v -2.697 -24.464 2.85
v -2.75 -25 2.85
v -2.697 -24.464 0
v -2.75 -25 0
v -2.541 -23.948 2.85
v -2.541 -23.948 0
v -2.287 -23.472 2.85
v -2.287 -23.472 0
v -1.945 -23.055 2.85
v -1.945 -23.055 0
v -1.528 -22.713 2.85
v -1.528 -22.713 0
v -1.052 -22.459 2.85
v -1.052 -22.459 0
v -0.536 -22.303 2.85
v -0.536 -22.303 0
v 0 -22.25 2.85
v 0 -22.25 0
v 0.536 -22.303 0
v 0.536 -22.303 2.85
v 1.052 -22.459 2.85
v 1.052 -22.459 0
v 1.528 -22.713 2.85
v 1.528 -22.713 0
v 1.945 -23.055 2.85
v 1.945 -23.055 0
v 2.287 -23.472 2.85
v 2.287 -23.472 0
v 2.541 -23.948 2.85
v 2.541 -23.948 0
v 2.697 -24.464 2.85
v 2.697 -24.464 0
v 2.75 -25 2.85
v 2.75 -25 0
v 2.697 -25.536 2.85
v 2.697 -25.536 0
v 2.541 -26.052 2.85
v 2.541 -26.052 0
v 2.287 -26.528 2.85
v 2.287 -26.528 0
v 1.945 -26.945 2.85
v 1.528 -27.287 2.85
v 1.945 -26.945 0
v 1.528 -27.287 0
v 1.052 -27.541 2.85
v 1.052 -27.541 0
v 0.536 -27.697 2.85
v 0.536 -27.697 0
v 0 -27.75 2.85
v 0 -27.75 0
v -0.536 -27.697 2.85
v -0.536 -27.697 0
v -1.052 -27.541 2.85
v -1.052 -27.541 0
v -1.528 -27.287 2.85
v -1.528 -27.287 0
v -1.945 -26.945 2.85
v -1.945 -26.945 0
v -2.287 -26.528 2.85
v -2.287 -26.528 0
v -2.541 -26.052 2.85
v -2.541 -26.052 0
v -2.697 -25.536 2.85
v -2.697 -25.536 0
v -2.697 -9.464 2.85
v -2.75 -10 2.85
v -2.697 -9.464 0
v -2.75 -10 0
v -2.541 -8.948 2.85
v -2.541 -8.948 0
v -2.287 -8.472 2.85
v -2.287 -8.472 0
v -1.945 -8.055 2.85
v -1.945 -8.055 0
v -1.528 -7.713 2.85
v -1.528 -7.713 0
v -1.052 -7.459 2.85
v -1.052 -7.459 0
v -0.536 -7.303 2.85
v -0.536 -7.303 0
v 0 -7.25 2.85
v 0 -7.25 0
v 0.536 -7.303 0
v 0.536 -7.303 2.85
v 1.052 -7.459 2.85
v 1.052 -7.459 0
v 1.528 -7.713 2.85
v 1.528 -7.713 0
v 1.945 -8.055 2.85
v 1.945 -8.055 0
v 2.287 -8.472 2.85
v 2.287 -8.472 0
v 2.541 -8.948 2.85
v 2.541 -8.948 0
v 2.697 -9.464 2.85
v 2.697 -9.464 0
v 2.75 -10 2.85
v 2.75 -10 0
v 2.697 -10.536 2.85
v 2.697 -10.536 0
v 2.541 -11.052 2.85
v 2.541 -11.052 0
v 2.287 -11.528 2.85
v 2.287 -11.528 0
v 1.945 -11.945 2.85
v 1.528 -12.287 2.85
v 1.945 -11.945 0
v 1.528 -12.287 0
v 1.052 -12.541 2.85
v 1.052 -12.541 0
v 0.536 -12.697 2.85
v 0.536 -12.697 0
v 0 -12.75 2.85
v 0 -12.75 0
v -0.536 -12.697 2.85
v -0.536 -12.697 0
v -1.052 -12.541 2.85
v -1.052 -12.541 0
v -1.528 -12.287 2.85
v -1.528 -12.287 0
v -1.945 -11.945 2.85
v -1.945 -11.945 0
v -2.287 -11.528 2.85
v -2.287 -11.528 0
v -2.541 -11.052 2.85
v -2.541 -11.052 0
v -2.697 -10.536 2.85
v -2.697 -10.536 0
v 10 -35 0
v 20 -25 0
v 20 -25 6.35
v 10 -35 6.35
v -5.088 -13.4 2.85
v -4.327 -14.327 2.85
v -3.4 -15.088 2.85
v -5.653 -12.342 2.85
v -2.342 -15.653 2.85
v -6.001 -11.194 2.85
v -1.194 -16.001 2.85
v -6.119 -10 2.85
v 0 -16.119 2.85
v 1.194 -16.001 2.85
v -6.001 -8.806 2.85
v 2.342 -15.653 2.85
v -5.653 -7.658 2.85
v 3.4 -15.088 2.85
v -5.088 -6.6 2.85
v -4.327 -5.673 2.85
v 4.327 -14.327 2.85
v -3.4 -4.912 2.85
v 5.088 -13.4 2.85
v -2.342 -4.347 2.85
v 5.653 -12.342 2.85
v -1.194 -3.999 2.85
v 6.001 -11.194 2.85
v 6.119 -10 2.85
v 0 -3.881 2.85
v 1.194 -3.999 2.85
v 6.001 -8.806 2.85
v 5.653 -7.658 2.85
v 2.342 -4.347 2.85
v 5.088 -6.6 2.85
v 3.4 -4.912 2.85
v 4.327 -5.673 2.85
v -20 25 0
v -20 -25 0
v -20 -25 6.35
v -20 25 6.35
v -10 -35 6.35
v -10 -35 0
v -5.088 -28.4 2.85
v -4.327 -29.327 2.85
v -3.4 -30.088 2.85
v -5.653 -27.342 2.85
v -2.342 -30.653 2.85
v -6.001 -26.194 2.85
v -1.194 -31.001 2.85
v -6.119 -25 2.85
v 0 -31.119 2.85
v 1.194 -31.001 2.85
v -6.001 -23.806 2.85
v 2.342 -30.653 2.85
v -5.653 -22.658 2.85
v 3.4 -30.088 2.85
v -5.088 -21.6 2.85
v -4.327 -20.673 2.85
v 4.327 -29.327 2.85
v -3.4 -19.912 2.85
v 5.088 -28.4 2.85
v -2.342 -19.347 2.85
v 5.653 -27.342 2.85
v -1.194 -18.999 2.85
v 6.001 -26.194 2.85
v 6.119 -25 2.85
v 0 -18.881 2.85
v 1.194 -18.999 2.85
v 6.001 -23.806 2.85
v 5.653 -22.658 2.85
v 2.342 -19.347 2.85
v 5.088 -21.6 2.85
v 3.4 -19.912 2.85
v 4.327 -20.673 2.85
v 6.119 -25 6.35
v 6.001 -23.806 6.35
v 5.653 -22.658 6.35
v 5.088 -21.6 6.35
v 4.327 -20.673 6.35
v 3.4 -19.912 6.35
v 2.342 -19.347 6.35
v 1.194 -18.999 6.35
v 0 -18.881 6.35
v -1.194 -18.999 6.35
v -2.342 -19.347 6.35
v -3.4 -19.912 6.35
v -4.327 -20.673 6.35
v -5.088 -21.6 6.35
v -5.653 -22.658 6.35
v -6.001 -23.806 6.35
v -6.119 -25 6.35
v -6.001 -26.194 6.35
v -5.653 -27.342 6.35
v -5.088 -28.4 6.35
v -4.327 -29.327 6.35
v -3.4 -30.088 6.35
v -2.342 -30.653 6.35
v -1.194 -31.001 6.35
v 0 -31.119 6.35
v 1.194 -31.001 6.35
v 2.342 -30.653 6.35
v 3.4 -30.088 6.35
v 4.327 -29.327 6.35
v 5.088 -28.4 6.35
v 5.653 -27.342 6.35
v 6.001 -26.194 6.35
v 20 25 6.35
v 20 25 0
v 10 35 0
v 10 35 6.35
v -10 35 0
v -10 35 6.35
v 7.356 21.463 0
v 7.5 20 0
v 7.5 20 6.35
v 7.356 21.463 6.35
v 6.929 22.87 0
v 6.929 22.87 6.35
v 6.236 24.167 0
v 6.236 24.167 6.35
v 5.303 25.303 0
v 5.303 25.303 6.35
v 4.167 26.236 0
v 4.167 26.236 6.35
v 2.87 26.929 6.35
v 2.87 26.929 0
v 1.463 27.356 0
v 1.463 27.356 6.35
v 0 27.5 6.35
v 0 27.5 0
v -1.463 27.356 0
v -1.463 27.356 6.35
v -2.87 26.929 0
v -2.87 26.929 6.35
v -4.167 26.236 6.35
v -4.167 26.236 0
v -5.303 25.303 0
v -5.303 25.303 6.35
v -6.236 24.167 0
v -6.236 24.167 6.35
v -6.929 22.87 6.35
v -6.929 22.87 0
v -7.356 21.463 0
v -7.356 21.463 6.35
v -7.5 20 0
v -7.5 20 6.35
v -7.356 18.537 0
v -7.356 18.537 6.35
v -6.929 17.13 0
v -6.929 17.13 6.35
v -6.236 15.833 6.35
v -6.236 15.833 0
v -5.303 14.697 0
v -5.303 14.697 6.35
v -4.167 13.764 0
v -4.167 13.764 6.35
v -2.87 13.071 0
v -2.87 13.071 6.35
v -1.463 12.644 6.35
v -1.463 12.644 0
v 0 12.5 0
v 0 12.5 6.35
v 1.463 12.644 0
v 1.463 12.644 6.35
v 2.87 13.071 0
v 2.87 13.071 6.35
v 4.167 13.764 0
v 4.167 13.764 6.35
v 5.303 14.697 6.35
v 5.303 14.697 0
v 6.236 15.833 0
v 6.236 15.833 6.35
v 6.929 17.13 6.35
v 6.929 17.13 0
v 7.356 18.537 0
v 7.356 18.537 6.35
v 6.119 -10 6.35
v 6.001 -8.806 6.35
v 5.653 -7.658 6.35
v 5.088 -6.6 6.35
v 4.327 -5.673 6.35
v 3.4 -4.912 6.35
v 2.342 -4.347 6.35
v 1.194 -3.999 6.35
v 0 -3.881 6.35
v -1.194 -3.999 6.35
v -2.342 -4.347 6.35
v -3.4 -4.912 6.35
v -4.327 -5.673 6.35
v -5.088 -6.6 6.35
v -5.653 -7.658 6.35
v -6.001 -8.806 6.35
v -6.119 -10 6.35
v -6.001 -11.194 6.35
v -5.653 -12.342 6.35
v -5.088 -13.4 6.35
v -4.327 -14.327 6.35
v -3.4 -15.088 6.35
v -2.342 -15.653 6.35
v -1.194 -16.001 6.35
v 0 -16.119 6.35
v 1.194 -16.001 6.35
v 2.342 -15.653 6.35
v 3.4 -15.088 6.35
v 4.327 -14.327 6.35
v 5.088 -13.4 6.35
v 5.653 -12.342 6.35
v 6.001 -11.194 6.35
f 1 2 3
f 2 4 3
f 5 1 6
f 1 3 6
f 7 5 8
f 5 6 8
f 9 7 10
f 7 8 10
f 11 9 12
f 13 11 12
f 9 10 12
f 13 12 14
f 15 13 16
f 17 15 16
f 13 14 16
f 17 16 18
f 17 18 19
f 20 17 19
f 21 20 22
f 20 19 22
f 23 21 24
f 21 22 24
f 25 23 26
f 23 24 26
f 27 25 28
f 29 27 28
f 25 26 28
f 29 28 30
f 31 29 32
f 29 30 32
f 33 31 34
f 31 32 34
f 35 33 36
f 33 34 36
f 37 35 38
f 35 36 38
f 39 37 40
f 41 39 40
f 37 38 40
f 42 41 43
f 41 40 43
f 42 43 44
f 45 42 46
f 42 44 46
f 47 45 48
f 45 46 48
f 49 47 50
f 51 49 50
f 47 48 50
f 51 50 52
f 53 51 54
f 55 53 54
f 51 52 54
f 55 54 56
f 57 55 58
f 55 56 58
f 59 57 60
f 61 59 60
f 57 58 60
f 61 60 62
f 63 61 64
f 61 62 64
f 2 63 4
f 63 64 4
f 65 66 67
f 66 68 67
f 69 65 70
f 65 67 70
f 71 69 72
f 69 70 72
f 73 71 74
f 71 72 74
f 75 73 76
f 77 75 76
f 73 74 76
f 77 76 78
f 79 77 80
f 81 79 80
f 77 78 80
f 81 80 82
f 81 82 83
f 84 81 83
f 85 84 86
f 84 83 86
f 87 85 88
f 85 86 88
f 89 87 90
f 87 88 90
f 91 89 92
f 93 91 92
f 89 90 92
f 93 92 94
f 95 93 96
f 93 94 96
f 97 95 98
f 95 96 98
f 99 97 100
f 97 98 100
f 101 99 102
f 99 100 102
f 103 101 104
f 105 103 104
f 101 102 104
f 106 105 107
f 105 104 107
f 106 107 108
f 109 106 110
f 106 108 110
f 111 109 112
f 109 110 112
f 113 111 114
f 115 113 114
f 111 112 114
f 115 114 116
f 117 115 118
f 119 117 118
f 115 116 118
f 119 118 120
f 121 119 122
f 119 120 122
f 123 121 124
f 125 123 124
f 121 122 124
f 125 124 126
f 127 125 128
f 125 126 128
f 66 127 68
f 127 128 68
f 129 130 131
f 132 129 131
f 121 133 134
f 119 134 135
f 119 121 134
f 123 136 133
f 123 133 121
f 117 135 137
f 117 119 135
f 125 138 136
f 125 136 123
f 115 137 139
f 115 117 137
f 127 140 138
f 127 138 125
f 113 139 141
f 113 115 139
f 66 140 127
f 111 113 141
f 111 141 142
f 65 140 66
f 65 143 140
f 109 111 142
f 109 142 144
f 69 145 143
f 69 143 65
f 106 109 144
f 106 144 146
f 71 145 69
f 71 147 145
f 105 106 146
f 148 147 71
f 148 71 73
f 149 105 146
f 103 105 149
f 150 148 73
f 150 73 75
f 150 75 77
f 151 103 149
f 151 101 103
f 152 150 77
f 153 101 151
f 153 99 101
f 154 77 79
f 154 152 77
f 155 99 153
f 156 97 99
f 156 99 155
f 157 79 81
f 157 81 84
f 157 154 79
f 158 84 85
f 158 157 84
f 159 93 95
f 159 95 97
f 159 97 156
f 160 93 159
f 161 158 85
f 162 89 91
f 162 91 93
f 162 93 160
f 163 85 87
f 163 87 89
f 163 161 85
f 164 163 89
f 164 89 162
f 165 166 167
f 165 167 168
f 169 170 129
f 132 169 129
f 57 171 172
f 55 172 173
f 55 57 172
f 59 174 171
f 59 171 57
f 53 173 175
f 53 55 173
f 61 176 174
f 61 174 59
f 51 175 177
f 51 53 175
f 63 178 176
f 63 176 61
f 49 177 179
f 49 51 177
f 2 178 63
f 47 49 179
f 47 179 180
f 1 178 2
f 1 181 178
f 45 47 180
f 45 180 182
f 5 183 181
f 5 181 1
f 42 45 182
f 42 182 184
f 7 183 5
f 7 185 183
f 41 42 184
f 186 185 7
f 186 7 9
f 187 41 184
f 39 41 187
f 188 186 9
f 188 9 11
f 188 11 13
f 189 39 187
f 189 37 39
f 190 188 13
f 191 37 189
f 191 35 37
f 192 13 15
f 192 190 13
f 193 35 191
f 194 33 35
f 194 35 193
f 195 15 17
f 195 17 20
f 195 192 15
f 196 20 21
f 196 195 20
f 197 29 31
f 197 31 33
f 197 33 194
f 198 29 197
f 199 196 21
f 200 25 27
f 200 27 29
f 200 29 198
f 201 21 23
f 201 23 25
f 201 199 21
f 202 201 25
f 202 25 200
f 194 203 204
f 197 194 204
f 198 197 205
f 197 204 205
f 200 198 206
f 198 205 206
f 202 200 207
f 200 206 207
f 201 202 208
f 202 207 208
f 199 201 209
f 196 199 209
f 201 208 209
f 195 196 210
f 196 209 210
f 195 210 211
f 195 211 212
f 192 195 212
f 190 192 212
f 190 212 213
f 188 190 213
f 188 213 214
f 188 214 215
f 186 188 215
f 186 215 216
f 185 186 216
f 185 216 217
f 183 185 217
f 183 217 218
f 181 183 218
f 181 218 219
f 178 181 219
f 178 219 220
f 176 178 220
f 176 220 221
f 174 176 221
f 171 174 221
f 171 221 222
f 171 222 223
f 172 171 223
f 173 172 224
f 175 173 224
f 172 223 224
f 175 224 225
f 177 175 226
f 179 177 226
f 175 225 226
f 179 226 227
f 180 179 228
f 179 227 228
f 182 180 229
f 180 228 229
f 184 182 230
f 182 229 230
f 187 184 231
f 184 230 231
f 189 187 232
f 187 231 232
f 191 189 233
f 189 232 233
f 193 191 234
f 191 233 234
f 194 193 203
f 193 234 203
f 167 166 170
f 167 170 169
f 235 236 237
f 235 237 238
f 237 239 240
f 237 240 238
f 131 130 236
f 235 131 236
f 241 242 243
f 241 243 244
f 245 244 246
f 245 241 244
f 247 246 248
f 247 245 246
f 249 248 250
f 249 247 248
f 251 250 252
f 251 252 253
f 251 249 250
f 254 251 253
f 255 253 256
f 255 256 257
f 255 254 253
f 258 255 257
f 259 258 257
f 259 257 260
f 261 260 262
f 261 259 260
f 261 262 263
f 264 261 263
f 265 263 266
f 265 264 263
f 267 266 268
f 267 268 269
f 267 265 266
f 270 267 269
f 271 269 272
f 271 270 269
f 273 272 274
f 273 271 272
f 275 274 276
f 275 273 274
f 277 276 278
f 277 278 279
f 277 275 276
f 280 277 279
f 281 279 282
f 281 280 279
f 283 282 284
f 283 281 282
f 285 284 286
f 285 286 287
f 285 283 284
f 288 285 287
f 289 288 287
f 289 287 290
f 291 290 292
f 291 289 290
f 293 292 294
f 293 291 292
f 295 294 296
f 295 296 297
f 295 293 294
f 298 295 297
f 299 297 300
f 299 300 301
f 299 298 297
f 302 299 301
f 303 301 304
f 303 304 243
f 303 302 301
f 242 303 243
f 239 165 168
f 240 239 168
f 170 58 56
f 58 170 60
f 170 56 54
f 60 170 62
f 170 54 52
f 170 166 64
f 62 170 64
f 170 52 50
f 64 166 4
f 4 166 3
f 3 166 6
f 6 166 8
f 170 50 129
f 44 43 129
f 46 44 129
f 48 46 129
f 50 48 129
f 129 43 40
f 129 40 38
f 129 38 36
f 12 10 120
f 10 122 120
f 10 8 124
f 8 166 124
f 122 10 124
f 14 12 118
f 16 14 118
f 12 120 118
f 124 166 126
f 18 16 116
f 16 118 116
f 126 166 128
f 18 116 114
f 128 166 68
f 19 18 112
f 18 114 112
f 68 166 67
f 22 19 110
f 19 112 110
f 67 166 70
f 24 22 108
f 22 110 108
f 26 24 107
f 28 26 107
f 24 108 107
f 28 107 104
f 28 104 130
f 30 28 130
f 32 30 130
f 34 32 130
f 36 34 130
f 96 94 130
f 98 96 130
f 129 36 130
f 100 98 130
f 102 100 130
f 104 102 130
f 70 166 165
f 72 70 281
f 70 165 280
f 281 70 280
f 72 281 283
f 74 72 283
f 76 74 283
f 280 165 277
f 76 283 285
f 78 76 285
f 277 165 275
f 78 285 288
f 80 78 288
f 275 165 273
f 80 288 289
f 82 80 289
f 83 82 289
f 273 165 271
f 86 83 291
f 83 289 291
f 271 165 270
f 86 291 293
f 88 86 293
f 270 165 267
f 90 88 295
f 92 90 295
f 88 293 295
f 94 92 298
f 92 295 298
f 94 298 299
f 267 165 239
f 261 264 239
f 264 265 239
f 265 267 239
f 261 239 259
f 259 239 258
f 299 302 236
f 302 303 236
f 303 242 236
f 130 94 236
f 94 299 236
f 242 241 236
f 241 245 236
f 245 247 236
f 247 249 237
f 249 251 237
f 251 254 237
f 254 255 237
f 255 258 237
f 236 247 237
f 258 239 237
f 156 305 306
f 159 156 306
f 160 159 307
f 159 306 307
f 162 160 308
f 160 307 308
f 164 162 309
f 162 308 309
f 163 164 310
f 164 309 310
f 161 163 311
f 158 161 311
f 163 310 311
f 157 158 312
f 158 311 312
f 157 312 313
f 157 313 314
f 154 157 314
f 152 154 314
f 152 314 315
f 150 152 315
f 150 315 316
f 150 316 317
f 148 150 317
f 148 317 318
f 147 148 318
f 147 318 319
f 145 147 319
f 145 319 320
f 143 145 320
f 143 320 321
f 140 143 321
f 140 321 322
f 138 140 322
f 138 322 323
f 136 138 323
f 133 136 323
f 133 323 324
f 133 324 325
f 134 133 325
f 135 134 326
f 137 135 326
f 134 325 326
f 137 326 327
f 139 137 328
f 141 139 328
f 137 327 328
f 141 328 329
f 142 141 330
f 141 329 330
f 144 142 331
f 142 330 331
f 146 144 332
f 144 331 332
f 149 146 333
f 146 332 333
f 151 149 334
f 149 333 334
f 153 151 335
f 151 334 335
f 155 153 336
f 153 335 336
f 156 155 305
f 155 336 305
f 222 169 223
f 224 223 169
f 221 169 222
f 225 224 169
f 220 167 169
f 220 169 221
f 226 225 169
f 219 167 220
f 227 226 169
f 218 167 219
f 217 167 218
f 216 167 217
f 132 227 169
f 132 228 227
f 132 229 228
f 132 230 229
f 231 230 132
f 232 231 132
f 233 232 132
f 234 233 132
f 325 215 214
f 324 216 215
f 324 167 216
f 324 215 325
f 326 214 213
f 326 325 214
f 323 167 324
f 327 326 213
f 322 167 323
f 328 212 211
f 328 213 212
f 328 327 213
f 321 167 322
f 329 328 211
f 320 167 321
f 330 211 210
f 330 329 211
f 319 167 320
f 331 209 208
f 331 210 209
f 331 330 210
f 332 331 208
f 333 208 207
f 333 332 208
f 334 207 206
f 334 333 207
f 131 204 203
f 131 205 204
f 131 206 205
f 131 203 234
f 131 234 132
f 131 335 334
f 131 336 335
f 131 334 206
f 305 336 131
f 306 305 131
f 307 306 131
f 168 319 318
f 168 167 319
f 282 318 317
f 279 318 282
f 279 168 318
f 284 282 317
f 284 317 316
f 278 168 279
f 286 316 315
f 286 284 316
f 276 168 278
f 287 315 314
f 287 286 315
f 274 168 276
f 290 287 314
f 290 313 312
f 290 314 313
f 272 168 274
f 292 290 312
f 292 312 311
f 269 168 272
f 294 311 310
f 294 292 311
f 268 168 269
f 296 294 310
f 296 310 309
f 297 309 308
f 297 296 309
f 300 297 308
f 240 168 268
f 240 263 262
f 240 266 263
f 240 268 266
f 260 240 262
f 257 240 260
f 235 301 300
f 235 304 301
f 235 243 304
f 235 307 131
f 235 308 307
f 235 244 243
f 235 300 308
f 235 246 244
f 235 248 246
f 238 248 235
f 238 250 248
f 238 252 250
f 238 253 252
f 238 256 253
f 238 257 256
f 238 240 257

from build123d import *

# Parameters (mm, degrees)
SKETCH1_W                               = 40
SKETCH1_H                               = 70
SKETCH1_R                               = 7.5
BOSS_EXTRUDE1_DEPTH                     = 6.35
CBORE_FOR_M5_HEX_HEAD_BOLT1_D           = 5.5
CBORE_FOR_M5_HEX_HEAD_BOLT1_CBORE_D     = 12.238
CBORE_FOR_M5_HEX_HEAD_BOLT1_CBORE_DEPTH = 3.5
CHAMFER1_SIZE                           = 10


with BuildPart() as part:
    # Sketch1 → Boss-Extrude1 (new body)
    with BuildSketch(Plane.XY):
        Rectangle(SKETCH1_W, SKETCH1_H)
        with Locations((0, 20)):
            Circle(SKETCH1_R, mode=Mode.SUBTRACT)
    extrude(amount=BOSS_EXTRUDE1_DEPTH)

    # CBORE for M5 Hex Head Bolt1 (through all)
    with Locations(Plane.XY.offset(6.35)):
        with Locations((0, -10), (0, -25)):
            CounterBoreHole(CBORE_FOR_M5_HEX_HEAD_BOLT1_D / 2, CBORE_FOR_M5_HEX_HEAD_BOLT1_CBORE_D / 2, CBORE_FOR_M5_HEX_HEAD_BOLT1_CBORE_DEPTH)

    # Chamfer1
    chamfer1_edges = [part.edges().sort_by_distance(p)[0] for p in [
        (-20, 35, 3.175),
        (20, 35, 3.175),
        (20, -35, 3.175),
        (-20, -35, 3.175),
    ]]
    chamfer(chamfer1_edges, length=CHAMFER1_SIZE)


solid = part.part
